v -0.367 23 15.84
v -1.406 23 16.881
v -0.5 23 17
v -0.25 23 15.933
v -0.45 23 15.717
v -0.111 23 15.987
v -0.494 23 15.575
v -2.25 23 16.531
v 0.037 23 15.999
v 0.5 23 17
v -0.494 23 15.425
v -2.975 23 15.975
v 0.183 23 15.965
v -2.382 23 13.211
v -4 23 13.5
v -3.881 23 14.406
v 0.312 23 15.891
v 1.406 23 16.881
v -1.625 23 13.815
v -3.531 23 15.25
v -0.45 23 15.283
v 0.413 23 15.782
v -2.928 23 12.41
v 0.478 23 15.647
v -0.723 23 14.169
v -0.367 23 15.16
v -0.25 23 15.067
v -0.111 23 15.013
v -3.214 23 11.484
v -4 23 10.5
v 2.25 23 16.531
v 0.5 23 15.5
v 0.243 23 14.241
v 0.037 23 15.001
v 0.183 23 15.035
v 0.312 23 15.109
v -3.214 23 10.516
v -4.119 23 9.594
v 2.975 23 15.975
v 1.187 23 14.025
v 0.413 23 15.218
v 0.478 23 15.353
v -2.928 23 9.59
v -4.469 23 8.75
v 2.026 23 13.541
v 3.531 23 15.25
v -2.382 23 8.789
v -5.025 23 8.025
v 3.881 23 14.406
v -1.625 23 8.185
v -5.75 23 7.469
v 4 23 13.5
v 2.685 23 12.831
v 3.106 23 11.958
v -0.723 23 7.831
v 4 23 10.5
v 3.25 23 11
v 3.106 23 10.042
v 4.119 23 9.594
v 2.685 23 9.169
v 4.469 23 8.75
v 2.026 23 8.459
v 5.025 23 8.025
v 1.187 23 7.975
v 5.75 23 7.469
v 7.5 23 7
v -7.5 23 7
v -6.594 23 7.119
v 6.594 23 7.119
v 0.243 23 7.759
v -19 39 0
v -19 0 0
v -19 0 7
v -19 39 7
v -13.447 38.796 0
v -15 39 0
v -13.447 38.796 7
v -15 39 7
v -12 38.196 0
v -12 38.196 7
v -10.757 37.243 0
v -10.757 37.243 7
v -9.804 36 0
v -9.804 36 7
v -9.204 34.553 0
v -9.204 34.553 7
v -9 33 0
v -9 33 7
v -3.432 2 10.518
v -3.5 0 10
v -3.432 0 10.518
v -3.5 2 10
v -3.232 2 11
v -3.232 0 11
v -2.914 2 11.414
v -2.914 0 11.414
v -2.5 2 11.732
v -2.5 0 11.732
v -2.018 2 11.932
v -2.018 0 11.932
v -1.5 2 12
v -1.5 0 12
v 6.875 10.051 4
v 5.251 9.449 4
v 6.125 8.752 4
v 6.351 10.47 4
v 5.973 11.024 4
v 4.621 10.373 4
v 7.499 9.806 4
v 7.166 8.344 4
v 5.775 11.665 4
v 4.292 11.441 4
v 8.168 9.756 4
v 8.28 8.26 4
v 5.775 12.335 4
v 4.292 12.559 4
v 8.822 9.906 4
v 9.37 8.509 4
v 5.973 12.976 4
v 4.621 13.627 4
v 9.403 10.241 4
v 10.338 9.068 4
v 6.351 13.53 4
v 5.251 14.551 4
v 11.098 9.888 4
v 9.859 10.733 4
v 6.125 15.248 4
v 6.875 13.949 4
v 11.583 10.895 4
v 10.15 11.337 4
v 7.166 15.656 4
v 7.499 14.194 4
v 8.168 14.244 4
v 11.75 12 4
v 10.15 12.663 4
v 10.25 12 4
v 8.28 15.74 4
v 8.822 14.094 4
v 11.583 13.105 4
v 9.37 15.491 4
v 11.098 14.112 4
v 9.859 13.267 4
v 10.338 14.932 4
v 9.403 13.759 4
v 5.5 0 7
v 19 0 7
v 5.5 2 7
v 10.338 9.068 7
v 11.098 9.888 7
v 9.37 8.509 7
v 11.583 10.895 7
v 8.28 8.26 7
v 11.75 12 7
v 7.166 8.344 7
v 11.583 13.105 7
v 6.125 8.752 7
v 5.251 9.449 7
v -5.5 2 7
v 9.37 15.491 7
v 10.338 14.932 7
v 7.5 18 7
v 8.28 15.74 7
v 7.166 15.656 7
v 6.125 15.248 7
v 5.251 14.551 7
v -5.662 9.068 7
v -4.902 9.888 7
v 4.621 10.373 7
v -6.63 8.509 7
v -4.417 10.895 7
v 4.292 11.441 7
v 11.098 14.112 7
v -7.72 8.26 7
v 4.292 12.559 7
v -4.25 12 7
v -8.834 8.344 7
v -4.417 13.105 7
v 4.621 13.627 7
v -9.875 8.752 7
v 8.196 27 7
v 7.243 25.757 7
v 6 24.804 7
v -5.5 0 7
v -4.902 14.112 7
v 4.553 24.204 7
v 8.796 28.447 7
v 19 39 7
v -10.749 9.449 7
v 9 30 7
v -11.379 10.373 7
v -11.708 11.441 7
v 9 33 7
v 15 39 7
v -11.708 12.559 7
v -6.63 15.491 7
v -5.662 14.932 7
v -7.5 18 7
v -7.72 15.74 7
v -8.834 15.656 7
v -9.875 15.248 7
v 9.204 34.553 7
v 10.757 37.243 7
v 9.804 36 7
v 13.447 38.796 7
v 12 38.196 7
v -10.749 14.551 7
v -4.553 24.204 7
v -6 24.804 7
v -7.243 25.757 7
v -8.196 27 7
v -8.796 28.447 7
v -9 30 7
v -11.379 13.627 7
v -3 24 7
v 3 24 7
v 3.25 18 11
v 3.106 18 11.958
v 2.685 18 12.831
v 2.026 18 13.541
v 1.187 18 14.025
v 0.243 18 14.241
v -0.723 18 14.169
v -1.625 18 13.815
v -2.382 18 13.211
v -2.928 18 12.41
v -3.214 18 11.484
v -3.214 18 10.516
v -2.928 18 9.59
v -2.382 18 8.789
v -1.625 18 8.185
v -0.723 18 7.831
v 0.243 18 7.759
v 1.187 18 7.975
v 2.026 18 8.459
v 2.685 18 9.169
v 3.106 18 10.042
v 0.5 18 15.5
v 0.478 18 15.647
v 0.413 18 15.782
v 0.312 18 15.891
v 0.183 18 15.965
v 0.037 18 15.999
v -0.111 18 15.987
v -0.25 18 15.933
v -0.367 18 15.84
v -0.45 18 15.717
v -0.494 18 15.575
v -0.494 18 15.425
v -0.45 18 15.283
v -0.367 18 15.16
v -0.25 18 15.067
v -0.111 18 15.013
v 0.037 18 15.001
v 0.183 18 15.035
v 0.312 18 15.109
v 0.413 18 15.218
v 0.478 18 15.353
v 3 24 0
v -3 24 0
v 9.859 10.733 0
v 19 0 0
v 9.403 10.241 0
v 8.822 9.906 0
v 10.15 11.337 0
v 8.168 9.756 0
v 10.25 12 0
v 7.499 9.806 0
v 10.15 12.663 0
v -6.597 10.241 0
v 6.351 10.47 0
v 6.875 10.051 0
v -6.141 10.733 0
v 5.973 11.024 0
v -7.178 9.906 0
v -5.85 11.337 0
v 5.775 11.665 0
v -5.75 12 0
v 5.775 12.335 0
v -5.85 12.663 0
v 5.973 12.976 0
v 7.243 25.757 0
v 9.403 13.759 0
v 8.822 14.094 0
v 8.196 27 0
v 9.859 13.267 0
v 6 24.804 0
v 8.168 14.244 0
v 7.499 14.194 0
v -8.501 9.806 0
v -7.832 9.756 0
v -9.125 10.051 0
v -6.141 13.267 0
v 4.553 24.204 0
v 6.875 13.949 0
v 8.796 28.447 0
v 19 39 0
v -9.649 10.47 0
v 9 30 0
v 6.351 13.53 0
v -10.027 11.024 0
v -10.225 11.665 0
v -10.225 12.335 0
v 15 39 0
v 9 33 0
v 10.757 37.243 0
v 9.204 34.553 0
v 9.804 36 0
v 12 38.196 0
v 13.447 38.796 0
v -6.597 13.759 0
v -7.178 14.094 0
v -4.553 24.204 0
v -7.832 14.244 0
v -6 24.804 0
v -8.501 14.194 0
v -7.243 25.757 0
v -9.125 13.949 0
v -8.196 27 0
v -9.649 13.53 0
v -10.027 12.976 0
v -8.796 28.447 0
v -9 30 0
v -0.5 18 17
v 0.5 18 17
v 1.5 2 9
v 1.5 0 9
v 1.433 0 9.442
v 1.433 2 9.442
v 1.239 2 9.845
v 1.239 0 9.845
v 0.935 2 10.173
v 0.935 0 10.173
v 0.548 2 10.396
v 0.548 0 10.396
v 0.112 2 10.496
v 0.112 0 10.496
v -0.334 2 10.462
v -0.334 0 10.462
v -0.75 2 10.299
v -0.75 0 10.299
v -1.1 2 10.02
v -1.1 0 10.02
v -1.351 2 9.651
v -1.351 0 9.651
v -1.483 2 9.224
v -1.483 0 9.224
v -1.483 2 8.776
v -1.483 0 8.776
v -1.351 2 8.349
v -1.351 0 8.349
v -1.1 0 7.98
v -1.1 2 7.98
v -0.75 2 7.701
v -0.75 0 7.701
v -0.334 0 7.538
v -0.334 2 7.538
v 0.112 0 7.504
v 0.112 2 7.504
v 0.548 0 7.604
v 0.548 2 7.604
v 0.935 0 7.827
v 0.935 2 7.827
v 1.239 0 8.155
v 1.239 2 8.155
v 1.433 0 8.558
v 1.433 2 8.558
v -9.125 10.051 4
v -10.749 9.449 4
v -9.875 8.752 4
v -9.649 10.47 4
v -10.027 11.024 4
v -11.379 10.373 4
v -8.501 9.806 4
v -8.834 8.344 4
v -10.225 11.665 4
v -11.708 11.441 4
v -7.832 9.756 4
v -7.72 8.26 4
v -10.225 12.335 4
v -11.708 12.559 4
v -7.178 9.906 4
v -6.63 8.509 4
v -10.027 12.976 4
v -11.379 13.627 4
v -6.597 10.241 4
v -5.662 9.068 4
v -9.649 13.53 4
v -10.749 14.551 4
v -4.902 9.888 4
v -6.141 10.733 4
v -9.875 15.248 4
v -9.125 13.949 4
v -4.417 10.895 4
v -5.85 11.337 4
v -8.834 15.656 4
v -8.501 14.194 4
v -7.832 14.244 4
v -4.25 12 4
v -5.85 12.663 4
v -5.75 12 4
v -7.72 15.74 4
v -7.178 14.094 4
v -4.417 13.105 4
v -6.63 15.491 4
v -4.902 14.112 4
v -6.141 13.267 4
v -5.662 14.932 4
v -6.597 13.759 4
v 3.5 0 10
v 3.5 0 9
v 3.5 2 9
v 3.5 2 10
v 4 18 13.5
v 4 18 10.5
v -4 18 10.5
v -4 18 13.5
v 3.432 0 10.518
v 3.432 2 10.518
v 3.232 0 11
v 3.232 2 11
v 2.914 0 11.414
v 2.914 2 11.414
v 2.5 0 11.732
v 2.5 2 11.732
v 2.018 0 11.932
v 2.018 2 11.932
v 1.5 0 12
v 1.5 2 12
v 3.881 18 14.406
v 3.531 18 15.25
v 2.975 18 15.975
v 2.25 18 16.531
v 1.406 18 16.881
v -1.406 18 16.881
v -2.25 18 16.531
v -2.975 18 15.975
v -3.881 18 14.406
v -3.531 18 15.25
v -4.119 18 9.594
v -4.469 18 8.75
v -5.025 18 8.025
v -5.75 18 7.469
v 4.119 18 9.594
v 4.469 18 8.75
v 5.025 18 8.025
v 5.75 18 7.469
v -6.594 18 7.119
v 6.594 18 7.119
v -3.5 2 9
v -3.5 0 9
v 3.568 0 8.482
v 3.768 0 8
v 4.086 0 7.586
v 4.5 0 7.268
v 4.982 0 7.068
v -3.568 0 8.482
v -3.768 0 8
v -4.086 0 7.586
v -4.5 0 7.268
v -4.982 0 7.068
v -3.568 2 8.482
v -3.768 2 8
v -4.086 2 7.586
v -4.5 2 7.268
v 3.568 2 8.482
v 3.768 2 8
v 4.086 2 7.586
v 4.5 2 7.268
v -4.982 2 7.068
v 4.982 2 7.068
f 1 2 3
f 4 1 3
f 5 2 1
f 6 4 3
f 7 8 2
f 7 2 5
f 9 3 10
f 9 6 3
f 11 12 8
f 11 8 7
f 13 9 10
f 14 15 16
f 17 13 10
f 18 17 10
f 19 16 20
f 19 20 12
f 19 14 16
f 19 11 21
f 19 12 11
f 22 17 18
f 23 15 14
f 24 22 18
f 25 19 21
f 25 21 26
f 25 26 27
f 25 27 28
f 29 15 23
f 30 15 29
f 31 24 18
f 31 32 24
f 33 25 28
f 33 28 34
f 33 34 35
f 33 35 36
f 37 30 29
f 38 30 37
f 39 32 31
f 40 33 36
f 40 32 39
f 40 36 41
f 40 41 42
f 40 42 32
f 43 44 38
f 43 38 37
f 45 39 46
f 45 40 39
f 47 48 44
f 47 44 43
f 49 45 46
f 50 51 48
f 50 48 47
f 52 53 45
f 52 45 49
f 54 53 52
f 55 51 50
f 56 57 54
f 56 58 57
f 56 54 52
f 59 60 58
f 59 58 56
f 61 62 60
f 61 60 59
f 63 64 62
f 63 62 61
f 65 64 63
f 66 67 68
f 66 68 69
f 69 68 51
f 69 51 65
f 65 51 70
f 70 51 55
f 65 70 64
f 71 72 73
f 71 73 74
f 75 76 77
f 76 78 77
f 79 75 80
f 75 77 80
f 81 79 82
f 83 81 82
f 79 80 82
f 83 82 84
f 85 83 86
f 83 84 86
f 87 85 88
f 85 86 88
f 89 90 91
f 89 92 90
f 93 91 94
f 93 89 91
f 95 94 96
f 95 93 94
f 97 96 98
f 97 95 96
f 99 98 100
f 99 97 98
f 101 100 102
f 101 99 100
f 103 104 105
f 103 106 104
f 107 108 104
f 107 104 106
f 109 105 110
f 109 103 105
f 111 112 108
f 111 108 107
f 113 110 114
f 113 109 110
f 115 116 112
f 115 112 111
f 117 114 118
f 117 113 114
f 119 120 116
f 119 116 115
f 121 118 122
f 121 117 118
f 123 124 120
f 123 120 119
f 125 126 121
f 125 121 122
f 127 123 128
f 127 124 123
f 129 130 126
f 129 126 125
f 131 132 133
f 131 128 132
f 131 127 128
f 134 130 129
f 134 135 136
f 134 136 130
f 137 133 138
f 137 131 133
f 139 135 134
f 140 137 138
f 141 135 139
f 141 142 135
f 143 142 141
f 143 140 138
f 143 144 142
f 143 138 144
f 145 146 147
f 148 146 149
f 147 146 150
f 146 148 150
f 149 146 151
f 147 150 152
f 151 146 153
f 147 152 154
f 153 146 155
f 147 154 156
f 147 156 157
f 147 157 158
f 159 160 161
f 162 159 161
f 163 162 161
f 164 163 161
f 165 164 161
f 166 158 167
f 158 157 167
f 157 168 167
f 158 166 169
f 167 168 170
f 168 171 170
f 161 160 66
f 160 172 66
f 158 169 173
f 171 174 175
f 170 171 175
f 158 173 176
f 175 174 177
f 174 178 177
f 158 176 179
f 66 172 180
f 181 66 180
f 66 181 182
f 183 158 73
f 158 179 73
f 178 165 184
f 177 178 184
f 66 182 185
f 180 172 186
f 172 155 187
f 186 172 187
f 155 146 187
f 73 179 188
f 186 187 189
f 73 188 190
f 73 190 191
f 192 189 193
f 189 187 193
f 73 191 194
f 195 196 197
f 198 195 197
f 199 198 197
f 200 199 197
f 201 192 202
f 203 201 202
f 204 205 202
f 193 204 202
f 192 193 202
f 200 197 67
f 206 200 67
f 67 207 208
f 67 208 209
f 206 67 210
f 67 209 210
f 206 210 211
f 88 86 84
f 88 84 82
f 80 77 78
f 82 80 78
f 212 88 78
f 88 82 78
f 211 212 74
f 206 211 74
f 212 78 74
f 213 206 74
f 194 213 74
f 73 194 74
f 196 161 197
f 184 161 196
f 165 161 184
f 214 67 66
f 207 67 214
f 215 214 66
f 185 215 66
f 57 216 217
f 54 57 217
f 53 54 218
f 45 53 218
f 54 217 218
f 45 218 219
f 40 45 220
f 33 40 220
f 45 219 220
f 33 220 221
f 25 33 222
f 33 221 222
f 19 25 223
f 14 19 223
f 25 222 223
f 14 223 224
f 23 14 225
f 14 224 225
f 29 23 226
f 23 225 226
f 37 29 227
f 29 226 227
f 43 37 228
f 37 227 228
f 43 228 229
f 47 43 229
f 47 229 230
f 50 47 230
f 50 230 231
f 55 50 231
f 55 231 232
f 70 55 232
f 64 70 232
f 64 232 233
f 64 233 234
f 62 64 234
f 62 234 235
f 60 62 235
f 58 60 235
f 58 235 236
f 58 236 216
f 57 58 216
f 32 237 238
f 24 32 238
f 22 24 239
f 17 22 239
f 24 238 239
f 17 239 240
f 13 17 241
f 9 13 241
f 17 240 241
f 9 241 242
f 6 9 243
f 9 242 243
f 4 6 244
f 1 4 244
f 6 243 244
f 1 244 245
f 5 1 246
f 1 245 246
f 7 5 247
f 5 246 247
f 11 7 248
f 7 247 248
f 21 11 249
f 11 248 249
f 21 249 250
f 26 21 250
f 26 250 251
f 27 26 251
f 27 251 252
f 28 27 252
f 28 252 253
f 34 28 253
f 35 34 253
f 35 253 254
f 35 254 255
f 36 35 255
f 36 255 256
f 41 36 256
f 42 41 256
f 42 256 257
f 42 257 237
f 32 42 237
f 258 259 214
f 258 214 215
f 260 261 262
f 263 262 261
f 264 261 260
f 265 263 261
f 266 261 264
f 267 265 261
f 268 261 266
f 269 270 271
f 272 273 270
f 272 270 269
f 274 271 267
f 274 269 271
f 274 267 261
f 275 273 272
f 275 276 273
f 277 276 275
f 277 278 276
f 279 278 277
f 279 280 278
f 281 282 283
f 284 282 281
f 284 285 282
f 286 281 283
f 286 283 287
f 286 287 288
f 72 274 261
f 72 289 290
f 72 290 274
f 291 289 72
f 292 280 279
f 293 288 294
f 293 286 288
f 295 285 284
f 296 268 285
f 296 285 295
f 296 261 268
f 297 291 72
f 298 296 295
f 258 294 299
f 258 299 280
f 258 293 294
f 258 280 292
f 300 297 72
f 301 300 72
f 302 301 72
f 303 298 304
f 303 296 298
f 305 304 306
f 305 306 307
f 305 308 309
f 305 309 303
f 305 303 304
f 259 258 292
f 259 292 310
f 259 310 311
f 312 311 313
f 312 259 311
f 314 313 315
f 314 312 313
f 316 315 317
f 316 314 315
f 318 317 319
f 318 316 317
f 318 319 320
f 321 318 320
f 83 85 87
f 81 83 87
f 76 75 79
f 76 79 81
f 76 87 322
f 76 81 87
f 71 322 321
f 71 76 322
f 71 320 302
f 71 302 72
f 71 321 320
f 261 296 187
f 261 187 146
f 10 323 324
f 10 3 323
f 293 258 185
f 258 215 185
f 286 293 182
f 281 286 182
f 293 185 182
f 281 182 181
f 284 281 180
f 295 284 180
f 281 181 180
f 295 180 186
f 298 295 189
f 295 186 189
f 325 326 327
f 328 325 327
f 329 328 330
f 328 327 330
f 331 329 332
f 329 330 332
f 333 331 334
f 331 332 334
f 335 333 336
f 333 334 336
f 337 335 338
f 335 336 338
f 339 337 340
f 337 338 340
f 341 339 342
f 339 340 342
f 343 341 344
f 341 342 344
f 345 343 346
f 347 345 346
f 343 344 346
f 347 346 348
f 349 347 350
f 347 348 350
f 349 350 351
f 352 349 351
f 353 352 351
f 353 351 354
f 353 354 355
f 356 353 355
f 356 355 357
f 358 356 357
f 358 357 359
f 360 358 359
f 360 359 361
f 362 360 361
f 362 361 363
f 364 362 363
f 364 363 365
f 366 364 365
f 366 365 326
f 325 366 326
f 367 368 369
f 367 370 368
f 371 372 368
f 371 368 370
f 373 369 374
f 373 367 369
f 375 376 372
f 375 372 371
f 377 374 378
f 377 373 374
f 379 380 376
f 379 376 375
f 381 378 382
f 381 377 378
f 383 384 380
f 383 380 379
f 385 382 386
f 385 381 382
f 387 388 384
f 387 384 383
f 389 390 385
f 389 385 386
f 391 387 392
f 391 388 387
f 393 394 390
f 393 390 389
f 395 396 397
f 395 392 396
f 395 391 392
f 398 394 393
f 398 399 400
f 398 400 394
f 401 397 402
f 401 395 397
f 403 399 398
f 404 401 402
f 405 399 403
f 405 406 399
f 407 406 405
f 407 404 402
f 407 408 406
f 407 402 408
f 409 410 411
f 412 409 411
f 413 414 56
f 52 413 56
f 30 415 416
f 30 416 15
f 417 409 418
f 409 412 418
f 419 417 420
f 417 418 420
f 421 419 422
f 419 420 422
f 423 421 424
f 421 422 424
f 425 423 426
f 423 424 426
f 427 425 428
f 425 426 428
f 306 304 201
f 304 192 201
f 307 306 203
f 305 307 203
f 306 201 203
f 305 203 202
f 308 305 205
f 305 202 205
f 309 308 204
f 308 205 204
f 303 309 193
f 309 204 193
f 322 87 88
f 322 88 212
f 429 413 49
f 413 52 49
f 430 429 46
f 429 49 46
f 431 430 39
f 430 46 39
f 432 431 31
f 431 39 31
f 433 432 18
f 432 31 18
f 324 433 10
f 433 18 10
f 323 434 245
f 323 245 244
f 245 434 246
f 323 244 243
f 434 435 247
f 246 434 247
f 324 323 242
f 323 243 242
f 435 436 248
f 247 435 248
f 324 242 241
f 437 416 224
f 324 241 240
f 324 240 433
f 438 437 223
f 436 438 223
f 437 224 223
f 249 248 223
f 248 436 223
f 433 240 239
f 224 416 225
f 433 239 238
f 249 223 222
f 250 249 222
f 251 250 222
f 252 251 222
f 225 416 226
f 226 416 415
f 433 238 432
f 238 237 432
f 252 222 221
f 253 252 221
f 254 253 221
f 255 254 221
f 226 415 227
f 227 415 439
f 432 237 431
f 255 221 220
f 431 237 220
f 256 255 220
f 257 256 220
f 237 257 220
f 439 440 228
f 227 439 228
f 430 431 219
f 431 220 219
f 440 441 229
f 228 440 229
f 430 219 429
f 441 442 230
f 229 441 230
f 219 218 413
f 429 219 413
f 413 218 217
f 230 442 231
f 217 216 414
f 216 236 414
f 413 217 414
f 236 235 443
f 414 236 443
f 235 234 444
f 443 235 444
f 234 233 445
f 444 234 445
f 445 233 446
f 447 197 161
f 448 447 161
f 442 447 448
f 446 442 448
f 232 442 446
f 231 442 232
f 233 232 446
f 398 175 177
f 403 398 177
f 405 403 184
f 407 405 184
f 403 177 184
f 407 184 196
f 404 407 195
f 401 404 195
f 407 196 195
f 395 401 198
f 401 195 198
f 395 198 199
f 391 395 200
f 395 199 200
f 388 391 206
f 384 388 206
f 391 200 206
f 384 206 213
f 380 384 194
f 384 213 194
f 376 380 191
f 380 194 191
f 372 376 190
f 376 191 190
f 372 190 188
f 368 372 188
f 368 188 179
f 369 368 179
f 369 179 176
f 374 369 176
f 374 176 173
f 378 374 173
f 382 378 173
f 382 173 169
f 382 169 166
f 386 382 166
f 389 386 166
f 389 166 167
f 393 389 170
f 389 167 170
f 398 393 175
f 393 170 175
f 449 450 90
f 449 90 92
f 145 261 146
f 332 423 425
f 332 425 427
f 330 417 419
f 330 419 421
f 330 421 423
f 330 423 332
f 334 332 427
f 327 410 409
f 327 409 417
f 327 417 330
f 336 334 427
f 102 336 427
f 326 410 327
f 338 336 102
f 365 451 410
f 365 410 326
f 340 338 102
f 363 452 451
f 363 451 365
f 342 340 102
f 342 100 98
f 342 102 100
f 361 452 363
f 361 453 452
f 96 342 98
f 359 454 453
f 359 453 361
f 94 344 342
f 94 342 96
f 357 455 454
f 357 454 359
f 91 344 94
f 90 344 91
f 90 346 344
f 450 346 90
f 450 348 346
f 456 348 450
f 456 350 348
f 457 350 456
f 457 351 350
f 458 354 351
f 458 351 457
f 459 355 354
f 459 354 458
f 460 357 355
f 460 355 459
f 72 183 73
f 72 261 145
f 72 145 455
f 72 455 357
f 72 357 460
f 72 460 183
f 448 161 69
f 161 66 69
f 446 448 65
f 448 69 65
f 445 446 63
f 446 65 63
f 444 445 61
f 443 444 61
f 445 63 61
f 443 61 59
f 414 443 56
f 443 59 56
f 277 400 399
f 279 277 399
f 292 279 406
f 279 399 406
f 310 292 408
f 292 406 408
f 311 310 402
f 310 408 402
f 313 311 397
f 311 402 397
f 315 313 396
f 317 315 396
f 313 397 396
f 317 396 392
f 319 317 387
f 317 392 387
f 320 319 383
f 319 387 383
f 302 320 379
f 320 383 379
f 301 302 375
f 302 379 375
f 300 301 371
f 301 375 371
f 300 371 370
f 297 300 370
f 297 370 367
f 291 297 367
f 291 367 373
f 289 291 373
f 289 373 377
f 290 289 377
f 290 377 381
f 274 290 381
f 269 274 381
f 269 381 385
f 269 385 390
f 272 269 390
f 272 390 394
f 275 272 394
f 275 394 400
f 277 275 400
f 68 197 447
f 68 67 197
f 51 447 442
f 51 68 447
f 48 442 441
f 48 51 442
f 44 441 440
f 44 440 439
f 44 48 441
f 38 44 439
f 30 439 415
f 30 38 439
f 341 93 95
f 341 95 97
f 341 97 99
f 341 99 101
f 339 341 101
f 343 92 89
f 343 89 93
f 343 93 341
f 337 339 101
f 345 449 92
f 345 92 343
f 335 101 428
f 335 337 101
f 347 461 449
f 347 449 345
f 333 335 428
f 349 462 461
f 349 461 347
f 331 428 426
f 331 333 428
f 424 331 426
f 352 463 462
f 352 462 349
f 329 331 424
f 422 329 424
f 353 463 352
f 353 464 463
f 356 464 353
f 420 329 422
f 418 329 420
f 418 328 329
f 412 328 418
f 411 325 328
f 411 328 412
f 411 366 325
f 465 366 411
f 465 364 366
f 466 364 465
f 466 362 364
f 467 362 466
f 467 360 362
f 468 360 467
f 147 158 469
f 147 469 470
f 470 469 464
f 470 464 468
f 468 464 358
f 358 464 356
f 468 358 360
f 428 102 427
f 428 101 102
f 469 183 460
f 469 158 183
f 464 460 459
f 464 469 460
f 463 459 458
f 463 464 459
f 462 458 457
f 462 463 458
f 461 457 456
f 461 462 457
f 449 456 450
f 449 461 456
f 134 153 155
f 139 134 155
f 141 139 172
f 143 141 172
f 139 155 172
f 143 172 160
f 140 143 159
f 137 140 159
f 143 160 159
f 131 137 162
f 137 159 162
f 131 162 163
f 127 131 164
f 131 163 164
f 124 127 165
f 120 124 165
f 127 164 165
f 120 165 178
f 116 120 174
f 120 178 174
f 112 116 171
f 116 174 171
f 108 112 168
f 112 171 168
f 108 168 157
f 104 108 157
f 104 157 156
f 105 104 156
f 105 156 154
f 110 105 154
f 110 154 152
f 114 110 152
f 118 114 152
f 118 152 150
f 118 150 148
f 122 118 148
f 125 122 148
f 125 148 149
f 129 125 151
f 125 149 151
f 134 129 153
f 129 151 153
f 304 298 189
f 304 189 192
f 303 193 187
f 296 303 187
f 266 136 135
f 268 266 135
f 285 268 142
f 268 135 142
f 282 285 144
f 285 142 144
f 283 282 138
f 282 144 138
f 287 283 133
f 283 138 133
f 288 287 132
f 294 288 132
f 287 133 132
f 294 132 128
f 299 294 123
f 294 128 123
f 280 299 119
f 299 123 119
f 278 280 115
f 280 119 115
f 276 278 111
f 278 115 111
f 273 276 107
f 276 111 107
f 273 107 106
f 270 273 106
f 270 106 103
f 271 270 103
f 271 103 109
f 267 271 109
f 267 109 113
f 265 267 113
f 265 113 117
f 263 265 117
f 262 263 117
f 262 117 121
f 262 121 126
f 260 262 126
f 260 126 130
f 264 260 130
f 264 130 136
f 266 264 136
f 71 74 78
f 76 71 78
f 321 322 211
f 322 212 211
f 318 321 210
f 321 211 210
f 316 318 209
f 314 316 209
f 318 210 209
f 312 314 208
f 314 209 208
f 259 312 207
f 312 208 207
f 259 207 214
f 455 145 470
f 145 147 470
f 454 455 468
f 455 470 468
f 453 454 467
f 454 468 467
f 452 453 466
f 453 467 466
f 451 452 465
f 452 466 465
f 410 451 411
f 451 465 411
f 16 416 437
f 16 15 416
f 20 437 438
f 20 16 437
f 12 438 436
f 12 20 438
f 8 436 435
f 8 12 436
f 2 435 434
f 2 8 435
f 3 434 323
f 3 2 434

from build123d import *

# Parameters (mm, degrees)
PAD_DEPTH       = 7
FILLET_R        = 6
SKETCH001_R     = 2.25
POCKET_DEPTH    = 8
SKETCH002_W     = 8
SKETCH002_H     = 5
PAD001_DEPTH    = 10
FILLET001_R     = 3.5
SKETCH003_R     = 3.25
SKETCH003_R_2   = 0.5
POCKET001_DEPTH = 7
SKETCH004_W     = 7
SKETCH004_H     = 2
PAD002_DEPTH    = 5
SKETCH005_R     = 1.5
POCKET002_DEPTH = 5
FILLET002_R     = 2
SKETCH006_R     = 3.75
POCKET003_DEPTH = 3


with BuildPart() as part:
    # Sketch → Pad (new body)
    with BuildSketch(Plane.XY):
        Polygon((19, 0), (-19, 0), (-19, 39), (-9, 39), (-9, 24), (9, 24), (9, 39), (19, 39), align=None)
    extrude(amount=PAD_DEPTH)

    # Fillet
    fillet_edges = [part.edges().sort_by_distance(p)[0] for p in [
        (-9, 39, 3.5),
        (-9, 24, 3.5),
        (9, 39, 3.5),
        (9, 24, 3.5),
    ]]
    fillet(fillet_edges, radius=FILLET_R)

    # Sketch001 (on Face5 of Fillet) → Pocket (cut)
    with BuildSketch(Plane.XY.offset(7)):
        with Locations((-8, 12)):
            Circle(SKETCH001_R)
        with Locations((8, 12)):
            Circle(SKETCH001_R)
    extrude(amount=-POCKET_DEPTH, mode=Mode.SUBTRACT)

    # Sketch002 (on Face5 of Pocket) → Pad001 (join)
    with BuildSketch(Plane.XY.offset(7)):
        with Locations((0, 20.5)):
            Rectangle(SKETCH002_W, SKETCH002_H)
    extrude(amount=PAD001_DEPTH)

    # Fillet001
    fillet001_edges = [part.edges().sort_by_distance(p)[0] for p in [
        (-4, 20.5, 7),
        (-4, 20.5, 17),
        (4, 20.5, 17),
        (4, 20.5, 7),
    ]]
    fillet(fillet001_edges, radius=FILLET001_R)

    # Sketch003 (on Face4 of Fillet001) → Pocket001 (cut)
    with BuildSketch(Plane.XZ.offset(-18)):
        with Locations((0, 11)):
            Circle(SKETCH003_R)
        with Locations((0, 15.5)):
            Circle(SKETCH003_R_2)
    extrude(amount=-POCKET001_DEPTH, mode=Mode.SUBTRACT)

    # Sketch004 (on Face1 of Pocket001) → Pad002 (join)
    with BuildSketch(Plane.XY.offset(7)):
        with Locations((0, 1)):
            Rectangle(SKETCH004_W, SKETCH004_H)
    extrude(amount=PAD002_DEPTH)

    # Sketch005 → Pocket002 (cut)
    with BuildSketch(Plane.XZ):
        with Locations((0, 9)):
            Circle(SKETCH005_R)
    extrude(amount=-POCKET002_DEPTH, mode=Mode.SUBTRACT)

    # Fillet002
    fillet002_edges = [part.edges().sort_by_distance(p)[0] for p in [
        (-3.5, 1, 12),
        (-3.5, 1, 7),
        (3.5, 1, 12),
        (3.5, 1, 7),
    ]]
    fillet(fillet002_edges, radius=FILLET002_R)

    # Sketch006 (on Face1 of Fillet002) → Pocket003 (cut)
    with BuildSketch(Plane.XY.offset(7)):
        with Locations((-8, 12)):
            Circle(SKETCH006_R)
        with Locations((8, 12)):
            Circle(SKETCH006_R)
    extrude(amount=-POCKET003_DEPTH, mode=Mode.SUBTRACT)


solid = part.part
